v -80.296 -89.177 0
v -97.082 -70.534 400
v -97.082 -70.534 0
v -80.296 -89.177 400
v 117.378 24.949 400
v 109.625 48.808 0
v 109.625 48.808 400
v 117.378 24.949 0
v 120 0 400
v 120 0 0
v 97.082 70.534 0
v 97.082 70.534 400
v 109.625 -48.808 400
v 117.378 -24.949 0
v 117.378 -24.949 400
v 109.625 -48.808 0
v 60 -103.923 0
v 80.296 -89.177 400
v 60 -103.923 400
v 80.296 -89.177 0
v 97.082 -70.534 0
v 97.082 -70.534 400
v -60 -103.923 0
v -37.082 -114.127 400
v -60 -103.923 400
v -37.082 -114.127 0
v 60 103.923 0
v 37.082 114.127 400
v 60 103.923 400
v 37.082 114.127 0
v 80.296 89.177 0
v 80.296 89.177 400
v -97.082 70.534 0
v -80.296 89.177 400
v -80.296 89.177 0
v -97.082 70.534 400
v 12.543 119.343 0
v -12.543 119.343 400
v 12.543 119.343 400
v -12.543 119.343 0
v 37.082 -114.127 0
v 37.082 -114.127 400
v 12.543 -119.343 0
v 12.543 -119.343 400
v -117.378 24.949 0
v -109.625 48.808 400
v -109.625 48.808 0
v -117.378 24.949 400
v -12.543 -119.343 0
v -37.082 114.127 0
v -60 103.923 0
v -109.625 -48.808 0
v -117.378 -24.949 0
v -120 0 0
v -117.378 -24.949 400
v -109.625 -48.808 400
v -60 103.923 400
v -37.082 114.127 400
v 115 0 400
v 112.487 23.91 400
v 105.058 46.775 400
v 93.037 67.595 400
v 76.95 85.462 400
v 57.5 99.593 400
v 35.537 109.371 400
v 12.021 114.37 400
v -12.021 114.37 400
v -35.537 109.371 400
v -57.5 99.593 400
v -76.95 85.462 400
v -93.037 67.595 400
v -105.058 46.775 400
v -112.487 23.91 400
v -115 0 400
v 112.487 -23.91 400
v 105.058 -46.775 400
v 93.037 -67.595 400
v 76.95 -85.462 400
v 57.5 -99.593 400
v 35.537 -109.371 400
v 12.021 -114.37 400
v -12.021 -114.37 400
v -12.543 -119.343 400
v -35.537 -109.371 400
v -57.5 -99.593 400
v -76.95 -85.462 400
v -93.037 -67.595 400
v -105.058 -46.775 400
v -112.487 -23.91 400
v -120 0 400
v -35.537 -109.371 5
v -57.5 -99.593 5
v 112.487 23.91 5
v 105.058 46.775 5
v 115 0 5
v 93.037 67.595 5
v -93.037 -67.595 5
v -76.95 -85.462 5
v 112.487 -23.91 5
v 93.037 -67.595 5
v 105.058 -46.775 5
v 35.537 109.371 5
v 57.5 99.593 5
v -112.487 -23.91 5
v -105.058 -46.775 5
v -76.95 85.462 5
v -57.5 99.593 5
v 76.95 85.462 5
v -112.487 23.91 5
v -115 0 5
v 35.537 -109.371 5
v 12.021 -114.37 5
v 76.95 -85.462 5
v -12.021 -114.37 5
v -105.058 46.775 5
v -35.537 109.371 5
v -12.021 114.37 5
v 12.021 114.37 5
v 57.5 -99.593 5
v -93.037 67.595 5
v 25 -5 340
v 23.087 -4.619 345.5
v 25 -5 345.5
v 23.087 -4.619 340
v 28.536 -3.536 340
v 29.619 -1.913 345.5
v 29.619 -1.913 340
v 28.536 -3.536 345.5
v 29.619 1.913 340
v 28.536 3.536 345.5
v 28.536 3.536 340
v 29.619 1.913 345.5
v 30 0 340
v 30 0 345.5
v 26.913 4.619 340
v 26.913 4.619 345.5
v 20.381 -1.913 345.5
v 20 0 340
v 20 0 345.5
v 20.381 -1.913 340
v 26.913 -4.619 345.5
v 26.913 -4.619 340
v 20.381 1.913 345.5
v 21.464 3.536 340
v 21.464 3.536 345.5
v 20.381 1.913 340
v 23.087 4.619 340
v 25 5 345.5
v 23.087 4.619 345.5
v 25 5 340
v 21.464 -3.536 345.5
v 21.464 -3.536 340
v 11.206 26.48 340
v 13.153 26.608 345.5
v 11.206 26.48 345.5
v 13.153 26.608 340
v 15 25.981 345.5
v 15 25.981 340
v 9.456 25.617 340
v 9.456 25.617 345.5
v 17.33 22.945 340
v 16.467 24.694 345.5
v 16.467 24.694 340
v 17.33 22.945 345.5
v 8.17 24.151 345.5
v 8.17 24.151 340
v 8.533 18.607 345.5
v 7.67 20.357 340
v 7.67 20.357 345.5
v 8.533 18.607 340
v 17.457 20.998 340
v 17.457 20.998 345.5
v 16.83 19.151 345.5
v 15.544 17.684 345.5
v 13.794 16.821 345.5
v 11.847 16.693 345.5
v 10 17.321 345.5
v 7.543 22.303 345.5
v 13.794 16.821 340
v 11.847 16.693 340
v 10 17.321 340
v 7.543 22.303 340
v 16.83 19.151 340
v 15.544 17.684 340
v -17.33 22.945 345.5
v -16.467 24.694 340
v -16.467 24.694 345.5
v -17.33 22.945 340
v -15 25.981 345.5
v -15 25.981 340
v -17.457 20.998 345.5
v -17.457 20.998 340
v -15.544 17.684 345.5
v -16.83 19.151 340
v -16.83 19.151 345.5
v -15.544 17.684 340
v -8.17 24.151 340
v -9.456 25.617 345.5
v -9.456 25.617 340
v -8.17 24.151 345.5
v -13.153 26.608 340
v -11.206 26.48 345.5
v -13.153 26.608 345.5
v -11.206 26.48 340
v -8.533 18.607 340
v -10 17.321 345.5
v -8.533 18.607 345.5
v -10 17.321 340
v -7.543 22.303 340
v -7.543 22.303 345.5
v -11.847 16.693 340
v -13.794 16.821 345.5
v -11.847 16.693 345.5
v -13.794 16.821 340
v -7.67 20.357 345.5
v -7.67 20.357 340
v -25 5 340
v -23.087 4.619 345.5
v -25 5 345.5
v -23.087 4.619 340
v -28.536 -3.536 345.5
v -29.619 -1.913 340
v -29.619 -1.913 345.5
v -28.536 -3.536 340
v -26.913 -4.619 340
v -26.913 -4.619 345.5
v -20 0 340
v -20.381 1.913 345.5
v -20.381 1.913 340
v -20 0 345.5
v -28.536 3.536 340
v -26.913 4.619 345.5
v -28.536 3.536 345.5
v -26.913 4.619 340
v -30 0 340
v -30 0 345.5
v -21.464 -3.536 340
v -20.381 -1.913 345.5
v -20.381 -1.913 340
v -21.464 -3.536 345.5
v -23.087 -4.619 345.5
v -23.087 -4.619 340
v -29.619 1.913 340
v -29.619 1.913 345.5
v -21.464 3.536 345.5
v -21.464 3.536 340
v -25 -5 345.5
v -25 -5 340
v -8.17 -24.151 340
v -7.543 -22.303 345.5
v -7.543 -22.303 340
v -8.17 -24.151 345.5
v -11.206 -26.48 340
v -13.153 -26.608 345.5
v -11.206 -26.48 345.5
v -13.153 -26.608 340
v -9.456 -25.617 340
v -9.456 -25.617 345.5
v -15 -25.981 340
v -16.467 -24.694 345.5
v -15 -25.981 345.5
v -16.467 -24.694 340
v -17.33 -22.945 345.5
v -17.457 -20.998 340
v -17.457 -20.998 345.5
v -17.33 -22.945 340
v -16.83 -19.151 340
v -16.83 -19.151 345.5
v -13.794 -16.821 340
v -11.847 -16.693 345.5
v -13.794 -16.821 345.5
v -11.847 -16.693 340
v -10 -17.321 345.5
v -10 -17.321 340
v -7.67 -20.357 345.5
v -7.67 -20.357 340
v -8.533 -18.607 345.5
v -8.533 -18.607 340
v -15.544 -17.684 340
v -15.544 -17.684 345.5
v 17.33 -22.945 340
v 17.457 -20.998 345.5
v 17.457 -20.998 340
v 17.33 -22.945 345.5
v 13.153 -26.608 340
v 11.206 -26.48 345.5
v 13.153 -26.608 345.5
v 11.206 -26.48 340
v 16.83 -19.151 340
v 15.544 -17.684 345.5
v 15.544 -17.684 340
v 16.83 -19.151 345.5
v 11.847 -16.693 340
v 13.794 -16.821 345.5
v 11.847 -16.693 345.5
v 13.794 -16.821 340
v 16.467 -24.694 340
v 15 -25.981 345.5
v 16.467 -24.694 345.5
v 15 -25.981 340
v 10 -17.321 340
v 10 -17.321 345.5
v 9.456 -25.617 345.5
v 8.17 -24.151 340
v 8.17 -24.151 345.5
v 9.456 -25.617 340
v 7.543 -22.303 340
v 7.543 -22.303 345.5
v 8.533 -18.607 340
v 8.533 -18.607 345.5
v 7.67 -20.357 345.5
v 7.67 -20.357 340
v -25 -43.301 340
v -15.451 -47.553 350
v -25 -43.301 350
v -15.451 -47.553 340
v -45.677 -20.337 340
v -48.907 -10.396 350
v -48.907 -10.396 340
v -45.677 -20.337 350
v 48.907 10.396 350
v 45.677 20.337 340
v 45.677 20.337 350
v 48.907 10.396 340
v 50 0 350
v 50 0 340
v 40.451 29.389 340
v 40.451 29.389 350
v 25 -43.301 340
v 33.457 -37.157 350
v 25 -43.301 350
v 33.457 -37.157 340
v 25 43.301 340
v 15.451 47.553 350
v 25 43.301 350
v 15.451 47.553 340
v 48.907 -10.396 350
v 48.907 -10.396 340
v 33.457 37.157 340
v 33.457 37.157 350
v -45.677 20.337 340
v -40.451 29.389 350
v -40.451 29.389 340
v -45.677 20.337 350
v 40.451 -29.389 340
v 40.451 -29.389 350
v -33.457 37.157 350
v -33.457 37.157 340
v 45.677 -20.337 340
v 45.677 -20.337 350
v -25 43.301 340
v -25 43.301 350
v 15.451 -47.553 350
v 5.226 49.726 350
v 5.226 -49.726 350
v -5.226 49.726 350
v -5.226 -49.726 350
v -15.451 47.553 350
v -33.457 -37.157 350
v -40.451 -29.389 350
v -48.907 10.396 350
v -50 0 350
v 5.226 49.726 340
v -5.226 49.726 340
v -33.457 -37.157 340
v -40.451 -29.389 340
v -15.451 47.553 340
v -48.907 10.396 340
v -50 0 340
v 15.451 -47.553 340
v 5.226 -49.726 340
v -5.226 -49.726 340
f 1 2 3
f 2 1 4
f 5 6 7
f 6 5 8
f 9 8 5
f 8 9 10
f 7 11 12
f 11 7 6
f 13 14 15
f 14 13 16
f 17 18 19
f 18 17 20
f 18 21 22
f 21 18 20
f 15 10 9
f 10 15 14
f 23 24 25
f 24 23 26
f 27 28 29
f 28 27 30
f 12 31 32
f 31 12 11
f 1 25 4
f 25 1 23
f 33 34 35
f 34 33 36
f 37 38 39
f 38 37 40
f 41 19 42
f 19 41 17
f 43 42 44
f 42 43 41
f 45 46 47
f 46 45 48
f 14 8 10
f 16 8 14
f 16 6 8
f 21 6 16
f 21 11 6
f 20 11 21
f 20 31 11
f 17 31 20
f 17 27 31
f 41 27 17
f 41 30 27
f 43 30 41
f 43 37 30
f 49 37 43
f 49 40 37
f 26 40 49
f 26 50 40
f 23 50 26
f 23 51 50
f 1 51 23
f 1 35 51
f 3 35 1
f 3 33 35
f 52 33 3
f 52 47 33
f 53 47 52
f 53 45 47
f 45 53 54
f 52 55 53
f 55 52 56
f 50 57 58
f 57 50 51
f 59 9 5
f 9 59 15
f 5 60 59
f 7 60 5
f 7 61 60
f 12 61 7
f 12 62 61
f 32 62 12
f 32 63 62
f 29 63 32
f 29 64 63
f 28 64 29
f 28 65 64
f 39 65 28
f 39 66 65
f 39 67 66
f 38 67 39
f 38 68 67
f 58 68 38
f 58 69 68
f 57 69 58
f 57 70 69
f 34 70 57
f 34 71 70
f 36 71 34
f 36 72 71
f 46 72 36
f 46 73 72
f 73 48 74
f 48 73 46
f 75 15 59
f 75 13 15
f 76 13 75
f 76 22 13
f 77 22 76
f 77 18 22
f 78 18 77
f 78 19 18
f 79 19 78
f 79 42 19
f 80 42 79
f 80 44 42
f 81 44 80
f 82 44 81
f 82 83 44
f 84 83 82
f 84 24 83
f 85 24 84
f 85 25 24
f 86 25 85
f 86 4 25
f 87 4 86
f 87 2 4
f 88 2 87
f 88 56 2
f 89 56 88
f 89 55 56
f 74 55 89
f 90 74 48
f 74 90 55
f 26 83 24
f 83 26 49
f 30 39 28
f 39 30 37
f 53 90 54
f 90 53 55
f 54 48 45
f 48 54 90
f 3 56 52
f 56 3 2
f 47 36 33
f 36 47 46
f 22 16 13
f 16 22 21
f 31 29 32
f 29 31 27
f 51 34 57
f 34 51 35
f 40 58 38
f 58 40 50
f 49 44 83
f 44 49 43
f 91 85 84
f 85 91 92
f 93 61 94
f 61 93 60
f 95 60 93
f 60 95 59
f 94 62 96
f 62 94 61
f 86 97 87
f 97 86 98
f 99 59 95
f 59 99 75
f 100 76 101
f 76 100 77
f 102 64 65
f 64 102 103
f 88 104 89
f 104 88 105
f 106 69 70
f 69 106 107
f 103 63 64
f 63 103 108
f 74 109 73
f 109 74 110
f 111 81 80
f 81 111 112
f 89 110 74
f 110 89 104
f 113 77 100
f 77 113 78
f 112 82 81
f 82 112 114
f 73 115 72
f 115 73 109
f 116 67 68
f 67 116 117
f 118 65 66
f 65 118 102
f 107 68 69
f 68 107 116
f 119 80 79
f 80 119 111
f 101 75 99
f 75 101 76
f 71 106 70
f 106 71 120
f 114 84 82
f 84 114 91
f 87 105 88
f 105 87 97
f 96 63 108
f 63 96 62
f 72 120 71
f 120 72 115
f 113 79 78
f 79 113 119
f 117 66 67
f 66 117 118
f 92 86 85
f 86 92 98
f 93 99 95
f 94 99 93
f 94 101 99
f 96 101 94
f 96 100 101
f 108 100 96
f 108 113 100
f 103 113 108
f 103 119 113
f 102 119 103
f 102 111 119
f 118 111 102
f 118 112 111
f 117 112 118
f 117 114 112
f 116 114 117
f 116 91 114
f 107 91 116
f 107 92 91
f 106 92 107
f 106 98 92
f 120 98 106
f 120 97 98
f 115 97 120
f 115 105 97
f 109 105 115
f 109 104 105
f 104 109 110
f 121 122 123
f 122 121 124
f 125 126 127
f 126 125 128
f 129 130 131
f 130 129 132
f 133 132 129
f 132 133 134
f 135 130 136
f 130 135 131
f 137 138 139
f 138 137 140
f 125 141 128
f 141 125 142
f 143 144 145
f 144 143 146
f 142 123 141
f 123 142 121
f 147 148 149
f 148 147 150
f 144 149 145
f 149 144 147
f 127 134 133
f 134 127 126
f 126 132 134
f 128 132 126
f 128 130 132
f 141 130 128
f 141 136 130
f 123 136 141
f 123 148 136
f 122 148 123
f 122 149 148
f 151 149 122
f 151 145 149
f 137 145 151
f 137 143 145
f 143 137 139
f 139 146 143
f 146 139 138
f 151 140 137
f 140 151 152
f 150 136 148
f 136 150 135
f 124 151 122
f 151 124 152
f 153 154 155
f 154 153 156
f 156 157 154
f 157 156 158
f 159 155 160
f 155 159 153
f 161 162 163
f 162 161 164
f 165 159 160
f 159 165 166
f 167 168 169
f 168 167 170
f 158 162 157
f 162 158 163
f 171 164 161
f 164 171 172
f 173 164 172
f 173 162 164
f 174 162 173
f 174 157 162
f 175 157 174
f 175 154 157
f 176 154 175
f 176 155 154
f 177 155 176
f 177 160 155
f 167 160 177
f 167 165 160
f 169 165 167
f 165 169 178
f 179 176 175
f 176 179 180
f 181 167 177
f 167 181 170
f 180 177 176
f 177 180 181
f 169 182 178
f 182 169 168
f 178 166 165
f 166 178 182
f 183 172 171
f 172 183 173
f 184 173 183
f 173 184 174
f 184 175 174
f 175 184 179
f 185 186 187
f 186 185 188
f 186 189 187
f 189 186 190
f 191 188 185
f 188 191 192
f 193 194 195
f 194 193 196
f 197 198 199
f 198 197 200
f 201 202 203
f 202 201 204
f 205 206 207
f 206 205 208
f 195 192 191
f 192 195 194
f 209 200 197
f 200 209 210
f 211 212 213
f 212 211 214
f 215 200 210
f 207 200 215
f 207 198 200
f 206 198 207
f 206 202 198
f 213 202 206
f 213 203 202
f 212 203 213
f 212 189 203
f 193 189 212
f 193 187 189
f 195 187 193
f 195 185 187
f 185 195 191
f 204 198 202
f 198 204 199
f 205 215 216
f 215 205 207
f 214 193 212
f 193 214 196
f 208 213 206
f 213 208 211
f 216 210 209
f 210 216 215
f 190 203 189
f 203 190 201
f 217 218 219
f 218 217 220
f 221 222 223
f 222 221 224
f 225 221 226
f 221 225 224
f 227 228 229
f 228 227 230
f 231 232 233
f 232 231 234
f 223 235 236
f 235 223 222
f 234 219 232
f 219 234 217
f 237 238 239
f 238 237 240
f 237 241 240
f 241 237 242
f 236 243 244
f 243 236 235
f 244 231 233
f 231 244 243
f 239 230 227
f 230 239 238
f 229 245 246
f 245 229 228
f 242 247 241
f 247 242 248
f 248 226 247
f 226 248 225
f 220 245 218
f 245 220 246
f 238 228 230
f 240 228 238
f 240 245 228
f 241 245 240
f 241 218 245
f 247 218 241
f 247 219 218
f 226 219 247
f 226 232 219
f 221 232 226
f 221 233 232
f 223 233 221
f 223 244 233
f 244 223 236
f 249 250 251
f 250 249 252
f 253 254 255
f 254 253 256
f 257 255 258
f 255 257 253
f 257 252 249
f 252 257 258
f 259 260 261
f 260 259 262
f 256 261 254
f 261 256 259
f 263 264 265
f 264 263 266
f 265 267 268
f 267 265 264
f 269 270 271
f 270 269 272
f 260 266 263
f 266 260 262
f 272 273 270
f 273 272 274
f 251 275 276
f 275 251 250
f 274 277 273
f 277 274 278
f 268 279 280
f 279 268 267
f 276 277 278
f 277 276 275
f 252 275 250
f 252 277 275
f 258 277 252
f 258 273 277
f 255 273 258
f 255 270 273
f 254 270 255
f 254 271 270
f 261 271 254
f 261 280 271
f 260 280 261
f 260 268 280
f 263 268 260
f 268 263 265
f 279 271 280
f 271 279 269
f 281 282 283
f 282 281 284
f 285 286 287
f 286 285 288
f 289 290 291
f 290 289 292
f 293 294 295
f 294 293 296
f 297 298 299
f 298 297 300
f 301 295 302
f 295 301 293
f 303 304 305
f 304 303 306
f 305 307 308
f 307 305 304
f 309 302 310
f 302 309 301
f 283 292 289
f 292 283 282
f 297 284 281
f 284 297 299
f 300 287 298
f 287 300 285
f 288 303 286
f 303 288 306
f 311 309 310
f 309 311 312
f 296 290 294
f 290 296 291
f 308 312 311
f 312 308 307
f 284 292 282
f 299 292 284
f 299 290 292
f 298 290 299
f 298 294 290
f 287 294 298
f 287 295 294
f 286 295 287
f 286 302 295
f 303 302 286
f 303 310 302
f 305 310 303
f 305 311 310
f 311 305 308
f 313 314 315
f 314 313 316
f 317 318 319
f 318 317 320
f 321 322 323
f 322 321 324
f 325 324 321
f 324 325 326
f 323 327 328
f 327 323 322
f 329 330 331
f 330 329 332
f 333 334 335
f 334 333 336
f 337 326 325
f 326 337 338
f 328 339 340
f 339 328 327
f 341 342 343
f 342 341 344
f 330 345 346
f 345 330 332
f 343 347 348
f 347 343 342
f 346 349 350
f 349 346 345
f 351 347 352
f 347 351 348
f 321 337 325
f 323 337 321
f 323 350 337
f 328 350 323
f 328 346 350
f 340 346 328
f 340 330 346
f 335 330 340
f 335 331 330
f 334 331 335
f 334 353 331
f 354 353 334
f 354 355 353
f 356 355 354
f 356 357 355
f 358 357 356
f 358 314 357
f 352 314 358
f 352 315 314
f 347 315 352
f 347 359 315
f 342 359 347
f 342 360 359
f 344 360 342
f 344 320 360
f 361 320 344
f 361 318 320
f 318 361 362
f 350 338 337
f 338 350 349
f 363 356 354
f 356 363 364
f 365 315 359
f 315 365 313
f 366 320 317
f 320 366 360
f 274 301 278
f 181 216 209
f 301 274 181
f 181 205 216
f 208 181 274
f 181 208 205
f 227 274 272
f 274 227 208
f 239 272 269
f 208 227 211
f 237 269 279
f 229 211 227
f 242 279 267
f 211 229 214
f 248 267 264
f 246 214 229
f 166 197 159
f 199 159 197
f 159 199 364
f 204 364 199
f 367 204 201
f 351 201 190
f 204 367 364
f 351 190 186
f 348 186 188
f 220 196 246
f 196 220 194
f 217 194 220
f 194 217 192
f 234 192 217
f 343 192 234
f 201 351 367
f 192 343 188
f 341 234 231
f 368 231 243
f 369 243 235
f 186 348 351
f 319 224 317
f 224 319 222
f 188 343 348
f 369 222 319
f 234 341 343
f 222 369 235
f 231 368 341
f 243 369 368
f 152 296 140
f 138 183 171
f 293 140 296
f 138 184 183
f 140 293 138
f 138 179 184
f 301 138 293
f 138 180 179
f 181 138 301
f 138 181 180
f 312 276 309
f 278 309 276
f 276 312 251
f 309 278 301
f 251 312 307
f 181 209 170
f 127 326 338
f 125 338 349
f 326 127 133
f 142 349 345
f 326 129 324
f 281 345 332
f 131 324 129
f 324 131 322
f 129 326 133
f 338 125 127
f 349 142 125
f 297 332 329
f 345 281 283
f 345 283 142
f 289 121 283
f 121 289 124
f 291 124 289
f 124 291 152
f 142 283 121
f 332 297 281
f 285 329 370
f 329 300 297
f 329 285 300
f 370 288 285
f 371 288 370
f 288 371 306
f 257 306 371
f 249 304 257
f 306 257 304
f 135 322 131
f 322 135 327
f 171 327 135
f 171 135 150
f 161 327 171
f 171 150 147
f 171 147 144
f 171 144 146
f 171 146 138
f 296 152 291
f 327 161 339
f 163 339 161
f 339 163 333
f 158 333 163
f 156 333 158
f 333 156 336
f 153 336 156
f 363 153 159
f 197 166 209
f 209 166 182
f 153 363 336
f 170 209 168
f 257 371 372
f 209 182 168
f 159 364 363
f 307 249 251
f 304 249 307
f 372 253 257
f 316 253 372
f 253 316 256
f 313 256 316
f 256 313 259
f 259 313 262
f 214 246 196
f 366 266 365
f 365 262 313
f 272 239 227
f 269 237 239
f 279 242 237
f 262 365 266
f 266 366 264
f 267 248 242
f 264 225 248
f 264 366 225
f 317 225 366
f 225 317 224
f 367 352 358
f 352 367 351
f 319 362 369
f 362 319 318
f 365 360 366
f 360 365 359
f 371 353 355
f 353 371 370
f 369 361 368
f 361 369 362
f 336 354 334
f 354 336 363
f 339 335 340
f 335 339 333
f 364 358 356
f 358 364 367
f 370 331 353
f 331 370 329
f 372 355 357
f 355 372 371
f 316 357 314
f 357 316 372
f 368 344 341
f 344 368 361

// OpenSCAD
// Parameters for the adjustable flue sheath
sheath_outer_diameter = 240;      // Outer diameter of the sheath (mm)
sheath_height = 400;             // Total height of the sheath (mm)
wall_thickness = 5;              // Wall thickness (mm)
inner_airbox_diameter = 150;     // Diameter of the internal air box (mm)
inner_airbox_height = 120;       // Height of the internal air box (mm)
flue_channel_diameter = 80;      // Diameter of the flue channel (mm)
steam_channel_diameter = 40;     // Diameter of the steam channel (mm)
fuel_access_width = 100;         // Width of the fuel access opening (mm)
fuel_access_height = 80;         // Height of the fuel access opening (mm)
spout_gap_width = 40;            // Width of the spout access opening (mm)
spout_gap_height = 30;           // Height of the spout access opening (mm)

kettle_flue_diameter = 80;       // Diameter of the flue (mm)

base_diameter = kettle_flue_diameter + 20; // Adjusted to be 20mm larger than the flue
// Parameters for the rotating control
rotating_input_diameter = 100;    // Diameter of the rotating input disk (mm)
rotating_input_thickness = 10;    // Thickness of the rotating control disk (mm)

// Main function
module adjustable_flue_sheath_with_openings() {
    // Outer sheath with integrated air box and access openings
    difference() {
        // Main rounded sheath
        cylinder(r=sheath_outer_diameter / 2, h=sheath_height, center=false);

        // Hollow interior
        translate([0, 0, wall_thickness])
        cylinder(r=(sheath_outer_diameter - 2 * wall_thickness) / 2, h=sheath_height - wall_thickness, center=false);

        // Internal air box
        translate([0, 0, sheath_height - inner_airbox_height])
        cylinder(r=inner_airbox_diameter / 2, h=inner_airbox_height, center=false);

        // Fuel access opening
        translate([0, sheath_outer_diameter / 4, fuel_access_height / 2])
        rounded_rectangle(fuel_access_width, fuel_access_height, wall_thickness);

        // Spout access opening
        translate([0, sheath_outer_diameter / 4, sheath_height - inner_airbox_height - spout_gap_height / 2])
        rounded_rectangle(spout_gap_width, spout_gap_height, wall_thickness);

        // Flue and steam channel paths
        flue_channel();
        steam_channel();
    }

    // Rotating control mechanism
    translate([0, 0, sheath_height - inner_airbox_height / 2])
    rotating_control();
}

// Rotating control mechanism
module rotating_control() {
    difference() {
        // Main control disk
        cylinder(r=rotating_input_diameter / 2, h=rotating_input_thickness, center=false);

        // Slots for air/steam control
        for (i = [0 : 60 : 360 - 60]) {
            rotate([0, 0, i])
            translate([rotating_input_diameter / 4, 0, 0])
            cylinder(r=5, h=rotating_input_thickness + 1, center=true);
        }
    }
}

// Fire-flue channel
module flue_channel() {
    translate([0, 0, flue_channel_offset()])
    cylinder(r=flue_channel_diameter / 2, h=sheath_height, center=false);
}

// Steam channel
module steam_channel() {
    translate([0, 0, steam_channel_offset()])
    cylinder(r=steam_channel_diameter / 2, h=sheath_height, center=false);
}

// Rounded rectangle helper function
module rounded_rectangle(width, height, thickness) {
    difference() {
        // Outer rounded rectangle
        minkowski() {
            square([width - thickness, height - thickness], center=true);
            circle(r=thickness / 2);
        }

        // Hollow interior
        translate([0, 0, -1])
        minkowski() {
            square([width - 2 * thickness, height - 2 * thickness], center=true);
            circle(r=(thickness / 2) - 1);
        }
    }
}

// Helpers to calculate offsets
function flue_channel_offset() = sheath_height - 80;
function steam_channel_offset() = sheath_height - 40;

// Render the adjustable flue sheath with openings
adjustable_flue_sheath_with_openings();
